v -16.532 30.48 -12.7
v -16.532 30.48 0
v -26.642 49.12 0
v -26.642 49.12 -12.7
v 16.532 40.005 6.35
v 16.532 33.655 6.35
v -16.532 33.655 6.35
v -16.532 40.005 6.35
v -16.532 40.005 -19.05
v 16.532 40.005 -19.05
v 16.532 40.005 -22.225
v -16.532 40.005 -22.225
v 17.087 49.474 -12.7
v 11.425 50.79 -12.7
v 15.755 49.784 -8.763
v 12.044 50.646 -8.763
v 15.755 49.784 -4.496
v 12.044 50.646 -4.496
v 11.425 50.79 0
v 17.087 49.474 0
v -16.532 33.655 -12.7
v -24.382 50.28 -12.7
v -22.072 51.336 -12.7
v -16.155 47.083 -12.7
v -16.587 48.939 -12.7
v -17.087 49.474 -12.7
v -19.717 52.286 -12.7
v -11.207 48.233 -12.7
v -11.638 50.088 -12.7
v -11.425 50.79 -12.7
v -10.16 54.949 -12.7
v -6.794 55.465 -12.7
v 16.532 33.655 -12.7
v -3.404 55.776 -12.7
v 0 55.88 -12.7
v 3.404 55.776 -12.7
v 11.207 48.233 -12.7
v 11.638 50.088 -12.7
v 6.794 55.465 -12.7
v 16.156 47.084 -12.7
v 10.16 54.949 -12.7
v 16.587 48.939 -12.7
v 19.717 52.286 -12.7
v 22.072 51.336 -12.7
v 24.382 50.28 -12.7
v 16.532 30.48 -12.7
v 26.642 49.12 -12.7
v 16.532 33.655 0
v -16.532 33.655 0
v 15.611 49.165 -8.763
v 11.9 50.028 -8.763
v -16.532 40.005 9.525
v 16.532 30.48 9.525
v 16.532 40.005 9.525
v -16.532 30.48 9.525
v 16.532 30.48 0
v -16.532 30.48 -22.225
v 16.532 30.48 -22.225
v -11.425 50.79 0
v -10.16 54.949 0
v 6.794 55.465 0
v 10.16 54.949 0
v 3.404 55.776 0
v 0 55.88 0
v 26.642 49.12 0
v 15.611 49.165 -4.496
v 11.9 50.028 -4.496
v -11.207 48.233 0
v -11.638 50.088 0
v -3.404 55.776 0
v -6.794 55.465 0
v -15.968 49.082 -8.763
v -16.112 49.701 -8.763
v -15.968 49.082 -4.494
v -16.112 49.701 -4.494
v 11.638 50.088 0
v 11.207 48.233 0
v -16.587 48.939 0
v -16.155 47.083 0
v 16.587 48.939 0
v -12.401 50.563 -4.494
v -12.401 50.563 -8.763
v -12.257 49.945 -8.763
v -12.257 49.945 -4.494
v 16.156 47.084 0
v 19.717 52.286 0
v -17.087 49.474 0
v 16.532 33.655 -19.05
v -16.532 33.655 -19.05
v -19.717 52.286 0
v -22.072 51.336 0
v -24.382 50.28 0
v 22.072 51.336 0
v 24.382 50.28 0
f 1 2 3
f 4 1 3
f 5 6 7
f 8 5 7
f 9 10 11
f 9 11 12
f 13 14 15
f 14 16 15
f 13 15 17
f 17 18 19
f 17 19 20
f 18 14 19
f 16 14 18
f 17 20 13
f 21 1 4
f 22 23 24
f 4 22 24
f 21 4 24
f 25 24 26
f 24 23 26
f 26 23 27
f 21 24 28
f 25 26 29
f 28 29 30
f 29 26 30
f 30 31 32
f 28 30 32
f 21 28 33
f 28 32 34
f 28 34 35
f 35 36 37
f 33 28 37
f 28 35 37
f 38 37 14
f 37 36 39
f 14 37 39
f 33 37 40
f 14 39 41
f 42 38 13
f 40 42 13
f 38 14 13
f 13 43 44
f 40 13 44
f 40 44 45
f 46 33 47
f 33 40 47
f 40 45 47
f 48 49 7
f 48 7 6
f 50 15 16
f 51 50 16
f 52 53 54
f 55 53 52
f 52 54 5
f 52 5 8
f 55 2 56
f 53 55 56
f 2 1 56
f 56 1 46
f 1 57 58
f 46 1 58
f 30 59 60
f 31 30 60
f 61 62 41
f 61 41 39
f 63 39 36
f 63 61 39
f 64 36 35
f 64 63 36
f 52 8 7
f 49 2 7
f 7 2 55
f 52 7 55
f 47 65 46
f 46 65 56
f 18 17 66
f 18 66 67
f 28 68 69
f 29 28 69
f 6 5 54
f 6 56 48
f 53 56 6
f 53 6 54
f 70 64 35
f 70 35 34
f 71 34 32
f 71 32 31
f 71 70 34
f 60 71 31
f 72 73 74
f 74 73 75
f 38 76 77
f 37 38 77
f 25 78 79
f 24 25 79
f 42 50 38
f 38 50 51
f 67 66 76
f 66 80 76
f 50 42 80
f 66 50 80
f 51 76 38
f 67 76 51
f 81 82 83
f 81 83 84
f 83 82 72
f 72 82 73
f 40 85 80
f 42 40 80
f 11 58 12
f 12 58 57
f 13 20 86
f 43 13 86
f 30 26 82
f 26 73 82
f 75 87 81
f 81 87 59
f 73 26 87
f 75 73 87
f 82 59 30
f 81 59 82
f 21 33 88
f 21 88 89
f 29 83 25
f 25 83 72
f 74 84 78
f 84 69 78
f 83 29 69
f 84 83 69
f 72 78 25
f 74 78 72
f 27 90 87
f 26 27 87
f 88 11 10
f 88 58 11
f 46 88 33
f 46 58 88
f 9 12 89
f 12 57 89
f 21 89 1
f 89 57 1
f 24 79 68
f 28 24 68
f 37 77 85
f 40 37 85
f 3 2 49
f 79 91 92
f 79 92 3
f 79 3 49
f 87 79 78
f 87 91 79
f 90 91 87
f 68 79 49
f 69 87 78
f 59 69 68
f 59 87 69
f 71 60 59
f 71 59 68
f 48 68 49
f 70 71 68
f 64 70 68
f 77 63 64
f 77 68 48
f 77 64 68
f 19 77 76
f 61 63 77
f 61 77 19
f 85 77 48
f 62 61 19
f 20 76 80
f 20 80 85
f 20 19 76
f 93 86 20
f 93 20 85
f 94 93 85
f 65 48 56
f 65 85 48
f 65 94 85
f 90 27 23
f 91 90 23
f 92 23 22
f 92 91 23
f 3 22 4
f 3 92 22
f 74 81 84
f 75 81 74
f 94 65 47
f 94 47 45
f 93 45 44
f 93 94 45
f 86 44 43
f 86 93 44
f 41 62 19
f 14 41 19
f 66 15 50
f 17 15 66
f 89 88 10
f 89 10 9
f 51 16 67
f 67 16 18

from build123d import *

# Parameters (mm, degrees)
EXTRUSION1_DEPTH = 12.7
SKETCH2_R        = 0.0001
EXTRUSION2_DEPTH = 12.7
EXTRUSION3_REACH = 47.242
SKETCH3_W        = 3.81
SKETCH3_H        = 4.269275936
EXTRUSION4_REACH = 47.242
SKETCH4_W        = 3.81
SKETCH4_H        = 4.2672
SKETCH5_W        = 33.063140678
SKETCH5_H        = 3.175
EXTRUSION5_DEPTH = 9.525
SKETCH6_W        = 33.063140678
SKETCH6_H        = 3.175
EXTRUSION6_DEPTH = 6.35
SKETCH7_W        = 33.063140678
SKETCH7_H        = 3.175
EXTRUSION7_DEPTH = 9.525
SKETCH8_W        = 33.063140678
SKETCH8_H        = 3.175
EXTRUSION8_DEPTH = 6.35


with BuildPart() as part:
    # Sketch1 → Extrusion1 (new body)
    with BuildSketch(Plane.XY):
        with BuildLine():
            Line((-46.835285843, 30.48), (46.835285843, 30.48))
            ThreePointArc((46.835285843, 30.48), (26.639744744, 49.121262199), (0, 55.88))
            ThreePointArc((0, 55.88), (-26.639744744, 49.121262199), (-46.835285843, 30.48))
        make_face()
    extrude(amount=-EXTRUSION1_DEPTH)

    # Sketch2 → Extrusion2 (cut)
    with BuildSketch(Plane.XY):
        Polygon((-17.087387335, 49.474285222), (-11.424998154, 50.789978227), (-10.16, 54.948601438), (-13.629796213, 58.658980697), (-18.577977015, 57.50923866), (-20.056361604, 52.649117364), align=None)
        Polygon((18.577977015, 57.50923866), (13.629796213, 58.658980697), (10.16, 54.948601438), (11.424998154, 50.789978227), (17.087387335, 49.474285222), (20.056361604, 52.649117364), align=None)
        with Locations((-0.000275836, 0.000298823)):
            Circle(SKETCH2_R)
        with BuildLine():
            Line((-46.835285843, 30.48), (-0.000330381, 0.000215009))
            Line((-0.000330381, 0.000215009), (-26.641574626, 49.120269761))
            ThreePointArc((-26.641574626, 49.120269761), (-37.902205349, 41.060896601), (-46.835285843, 30.48))
        make_face()
        with Locations((0.000275836, 0.000298823)):
            Circle(SKETCH2_R)
        with BuildLine():
            Line((26.641574627, 49.120269761), (0.000187932, 0.0003465))
            Line((0.000187932, 0.0003465), (46.835285843, 30.48))
            ThreePointArc((46.835285843, 30.48), (37.902205349, 41.060896601), (26.641574627, 49.120269761))
        make_face()
        Polygon((11.207321789, 48.233301672), (16.155502591, 47.083559635), (16.586565391, 48.938738106), (11.638384589, 50.088480143), align=None)
        Polygon((-16.155412127, 47.083170305), (-11.207231325, 48.232912342), (-11.638384589, 50.088480143), (-16.586565391, 48.938738106), align=None)
    extrude(amount=-EXTRUSION2_DEPTH, mode=Mode.SUBTRACT)

    # Sketch3 → Extrusion3 (cut, up to next)
    with BuildSketch(Plane(origin=(-11.782102344, 50.707002743, 0), x_dir=(-0.9740513389582227, -0.22632717263663577, 0), z_dir=(-0.22632717263663577, 0.9740513389582227, 0)), mode=Mode.PRIVATE) as extrusion3_sk1:
        with Locations((2.54, -6.628362032)):
            Rectangle(SKETCH3_W, SKETCH3_H)
    extrusion3_tool1 = extrude(extrusion3_sk1.sketch, amount=-EXTRUSION3_REACH, mode=Mode.PRIVATE) & part.part
    add(extrusion3_tool1.solids().sort_by_distance((-14.256193, 50.132132, -6.628362))[0], mode=Mode.SUBTRACT)

    # Sketch4 → Extrusion4 (cut, up to next)
    with BuildSketch(Plane(origin=(11.782102344, 50.707002743, 0), x_dir=(-0.974051338958225, 0.22632717263662588, 0), z_dir=(0.2263271726366259, 0.9740513389582252, 0)), mode=Mode.PRIVATE) as extrusion4_sk1:
        with Locations((-2.173382579, -6.6294)):
            Rectangle(SKETCH4_W, SKETCH4_H)
    extrusion4_tool1 = extrude(extrusion4_sk1.sketch, amount=-EXTRUSION4_REACH, mode=Mode.PRIVATE) & part.part
    add(extrusion4_tool1.solids().sort_by_distance((13.899089, 50.215107, -6.6294))[0], mode=Mode.SUBTRACT)

    # Sketch5 → Extrusion5 (add)
    with BuildSketch(Plane(origin=(0, 0, -12.7), x_dir=(-1, 0, 0), z_dir=(0, 0, -1))):
        with Locations((0, 32.0675)):
            Rectangle(SKETCH5_W, SKETCH5_H)
    extrude(amount=EXTRUSION5_DEPTH)

    # Sketch6 → Extrusion6 (add)
    with BuildSketch(Plane(origin=(0, 33.655, 0), x_dir=(-1, 0, 0), z_dir=(0, 1, 0))):
        with Locations((0, -20.6375)):
            Rectangle(SKETCH6_W, SKETCH6_H)
    extrude(amount=EXTRUSION6_DEPTH)

    # Sketch7 → Extrusion7 (add)
    with BuildSketch(Plane.XY):
        with Locations((0, 32.0675)):
            Rectangle(SKETCH7_W, SKETCH7_H)
    extrude(amount=EXTRUSION7_DEPTH)

    # Sketch8 → Extrusion8 (add)
    with BuildSketch(Plane(origin=(0, 33.655, 0), x_dir=(-1, 0, 0), z_dir=(0, 1, 0))):
        with Locations((0, 7.9375)):
            Rectangle(SKETCH8_W, SKETCH8_H)
    extrude(amount=EXTRUSION8_DEPTH)


solid = part.part
